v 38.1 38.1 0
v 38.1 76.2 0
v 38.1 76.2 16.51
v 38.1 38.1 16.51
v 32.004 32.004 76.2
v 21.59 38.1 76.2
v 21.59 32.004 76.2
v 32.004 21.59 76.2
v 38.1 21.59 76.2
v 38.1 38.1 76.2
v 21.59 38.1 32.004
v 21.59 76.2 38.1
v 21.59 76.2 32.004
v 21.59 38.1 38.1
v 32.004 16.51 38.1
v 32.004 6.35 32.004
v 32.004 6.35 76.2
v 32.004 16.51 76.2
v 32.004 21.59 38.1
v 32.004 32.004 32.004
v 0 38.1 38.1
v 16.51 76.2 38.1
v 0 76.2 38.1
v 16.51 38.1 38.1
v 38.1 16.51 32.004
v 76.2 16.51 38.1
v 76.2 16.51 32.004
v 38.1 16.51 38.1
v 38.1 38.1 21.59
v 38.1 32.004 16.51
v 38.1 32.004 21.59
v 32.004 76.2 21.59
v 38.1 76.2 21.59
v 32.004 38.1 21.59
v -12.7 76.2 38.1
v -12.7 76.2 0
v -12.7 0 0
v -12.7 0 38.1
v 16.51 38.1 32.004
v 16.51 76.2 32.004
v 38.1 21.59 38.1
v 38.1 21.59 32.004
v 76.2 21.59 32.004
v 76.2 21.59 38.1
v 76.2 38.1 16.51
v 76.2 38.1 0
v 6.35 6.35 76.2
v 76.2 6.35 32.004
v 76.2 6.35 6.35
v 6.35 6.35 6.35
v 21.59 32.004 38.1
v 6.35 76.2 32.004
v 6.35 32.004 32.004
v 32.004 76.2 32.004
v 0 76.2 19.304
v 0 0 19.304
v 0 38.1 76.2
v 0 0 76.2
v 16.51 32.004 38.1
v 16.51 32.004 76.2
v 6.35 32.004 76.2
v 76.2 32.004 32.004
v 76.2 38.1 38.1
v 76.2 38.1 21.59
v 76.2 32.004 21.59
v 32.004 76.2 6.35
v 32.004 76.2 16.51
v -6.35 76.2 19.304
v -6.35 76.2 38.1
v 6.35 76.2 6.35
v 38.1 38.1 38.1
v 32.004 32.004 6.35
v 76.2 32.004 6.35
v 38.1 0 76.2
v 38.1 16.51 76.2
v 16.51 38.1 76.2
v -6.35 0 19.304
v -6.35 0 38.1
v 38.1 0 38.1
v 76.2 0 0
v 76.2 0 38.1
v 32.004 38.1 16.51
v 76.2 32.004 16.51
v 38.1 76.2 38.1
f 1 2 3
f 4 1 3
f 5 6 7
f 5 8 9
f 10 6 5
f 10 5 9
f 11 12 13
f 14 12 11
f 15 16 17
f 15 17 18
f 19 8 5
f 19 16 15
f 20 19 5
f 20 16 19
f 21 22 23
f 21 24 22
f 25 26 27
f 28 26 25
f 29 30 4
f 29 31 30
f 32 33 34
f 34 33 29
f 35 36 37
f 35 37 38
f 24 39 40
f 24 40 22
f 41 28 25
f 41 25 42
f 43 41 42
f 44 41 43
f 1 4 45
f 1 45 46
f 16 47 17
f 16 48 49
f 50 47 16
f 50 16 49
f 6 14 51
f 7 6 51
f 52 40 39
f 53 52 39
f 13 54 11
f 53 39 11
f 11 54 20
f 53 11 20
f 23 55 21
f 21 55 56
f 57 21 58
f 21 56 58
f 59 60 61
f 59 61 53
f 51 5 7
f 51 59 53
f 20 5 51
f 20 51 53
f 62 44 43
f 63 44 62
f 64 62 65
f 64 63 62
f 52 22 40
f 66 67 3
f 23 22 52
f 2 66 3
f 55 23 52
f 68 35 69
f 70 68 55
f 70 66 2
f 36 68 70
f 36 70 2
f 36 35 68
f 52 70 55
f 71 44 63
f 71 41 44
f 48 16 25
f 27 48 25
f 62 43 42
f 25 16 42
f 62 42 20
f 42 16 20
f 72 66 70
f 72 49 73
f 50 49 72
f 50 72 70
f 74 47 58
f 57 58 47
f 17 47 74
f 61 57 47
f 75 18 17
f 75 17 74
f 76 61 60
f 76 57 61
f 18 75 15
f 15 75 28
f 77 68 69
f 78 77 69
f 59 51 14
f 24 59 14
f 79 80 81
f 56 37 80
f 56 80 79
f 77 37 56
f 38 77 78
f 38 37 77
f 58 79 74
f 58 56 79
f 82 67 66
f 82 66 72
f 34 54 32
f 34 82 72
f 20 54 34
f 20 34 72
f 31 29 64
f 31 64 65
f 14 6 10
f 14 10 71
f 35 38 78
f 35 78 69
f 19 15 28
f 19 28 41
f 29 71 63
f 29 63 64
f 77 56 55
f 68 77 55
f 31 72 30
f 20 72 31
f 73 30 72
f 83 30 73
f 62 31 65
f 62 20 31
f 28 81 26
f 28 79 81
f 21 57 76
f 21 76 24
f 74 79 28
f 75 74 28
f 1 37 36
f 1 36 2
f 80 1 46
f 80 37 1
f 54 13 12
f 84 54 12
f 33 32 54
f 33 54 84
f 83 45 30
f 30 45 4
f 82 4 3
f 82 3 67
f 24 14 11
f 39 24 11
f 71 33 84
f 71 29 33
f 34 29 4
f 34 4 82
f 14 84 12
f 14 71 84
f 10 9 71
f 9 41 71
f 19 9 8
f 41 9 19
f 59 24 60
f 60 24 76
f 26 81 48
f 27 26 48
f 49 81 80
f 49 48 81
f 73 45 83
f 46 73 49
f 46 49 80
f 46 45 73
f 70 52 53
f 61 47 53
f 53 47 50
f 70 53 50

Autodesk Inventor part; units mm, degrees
ref_plane "YZ Plane" through (0, 0, 0) normal (1, 0, 0) x (0, 1, 0)
ref_plane "XZ Plane" through (0, 0, 0) normal (0, 1, 0) x (-1, 0, 0)
ref_plane "XY Plane" through (0, 0, 0) normal (0, 0, 1) x (1, 0, 0)
sketch "Sketch1" plane through (0, 0, 0) normal (0, 0, 1) x (1, 0, 0)
  line L0 (0, 0) -> (38.1, 0)
  line L1 (38.1, 0) -> (38.1, 38.1)
  line L2 (38.1, 38.1) -> (0, 38.1)
  line L3 (0, 38.1) -> (0, 0)
  dimension "d0" = 38.1
  dimension "d1" = 38.1
extrude "Extrusion1" add sketch "Sketch1" along normal blind 38.1
sketch "Sketch2" plane through (0, 0, 38.1) normal (0, 0, 1) x (1, 0, 0)
  line L0 (6.35, 6.35) -> (32.004, 6.35)
  line L1 (32.004, 6.35) -> (32.004, 32.004)
  line L2 (32.004, 32.004) -> (6.35, 32.004)
  line L3 (6.35, 32.004) -> (6.35, 6.35)
  line L4 (38.1, 0) -> (38.1, 38.1) projected
  line L5 (0, 0) -> (38.1, 0)
  line L6 (38.1, 0) -> (38.1, 38.1)
  line L7 (38.1, 38.1) -> (0, 38.1)
  line L8 (0, 38.1) -> (0, 0)
  dimension "d4" = 25.654
  dimension "d5" = 25.654
extrude "Extrusion2" cut sketch "Sketch2" against normal blind 31.75 contours L3 L2 L1 L0
sketch "Sketch5" plane through (0, 0, 38.1) normal (0, 0, 1) x (1, 0, 0)
  line L0 (6.35, 6.35) -> (6.35, 32.004) projected
  line L1 (6.35, 6.35) -> (32.004, 6.35)
  line L2 (32.004, 6.35) -> (32.004, 32.004)
  line L3 (32.004, 32.004) -> (6.35, 32.004)
  line L4 (6.35, 32.004) -> (6.35, 6.35)
  line L5 (0, 0) -> (38.1, 0) projected
  line L6 (0, 0) -> (38.1, 0)
  line L7 (38.1, 0) -> (38.1, 38.1)
  line L8 (38.1, 38.1) -> (0, 38.1)
  line L9 (0, 38.1) -> (0, 0)
extrude "Extrusion4" add sketch "Sketch5" along normal blind 38.1
sketch "Sketch7" plane through (38.1, 0, 0) normal (1, 0, 0) x (0, 0, -1)
  line L0 (0, 0) -> (-76.2, 0) projected
  line L1 (0, 0) -> (-38.1, 0)
  line L2 (-38.1, 0) -> (-38.1, 38.1)
  line L3 (-38.1, 38.1) -> (0, 38.1)
  line L4 (0, 38.1) -> (0, 0)
  line L5 (-76.2, 6.35) -> (-6.35, 6.35) projected
  line L6 (-6.35, 6.35) -> (-32.004, 6.35)
  line L7 (-32.004, 6.35) -> (-32.004, 32.004)
  line L8 (-32.004, 32.004) -> (-6.35, 32.004)
  line L9 (-6.35, 32.004) -> (-6.35, 6.35)
  dimension "d16" = 38.1
  dimension "d17" = 38.1
  dimension "d20" = 25.654
  dimension "d21" = 25.654
extrude "Extrusion6" add sketch "Sketch7" along normal blind 38.1
sketch "Sketch9" plane through (38.1, 6.35, 6.35) normal (1, 0, 0) x (0, 0, -1)
  line L0 (-25.654, 0) -> (-25.654, 25.654) projected
  line L1 (0, 0) -> (0, 25.654) projected
  line L2 (-25.654, 0) -> (0, 0)
  line L3 (0, 0) -> (0, 25.654)
  line L4 (0, 25.654) -> (-25.654, 25.654)
  line L5 (-25.654, 25.654) -> (-25.654, 0)
  point P0 (6.35, -6.35)
extrude "Extrusion7" cut sketch "Sketch9" against normal blind 31.75
sketch "Sketch10" plane through (0, 38.1, 76.2) normal (0, 1, 0) x (1, 0, 0)
  line L0 (76.2, 69.85) -> (6.35, 69.85) projected
  line L1 (6.35, 69.85) -> (32.004, 69.85)
  line L2 (32.004, 69.85) -> (32.004, 44.196)
  line L3 (32.004, 44.196) -> (6.35, 44.196)
  line L4 (6.35, 44.196) -> (6.35, 69.85)
  line L5 (38.1, 38.1) -> (38.1, 0) projected
  line L6 (0, 76.2) -> (0, 0) projected
  line L7 (38.1, 38.1) -> (0, 38.1)
  line L8 (0, 38.1) -> (0, 76.2)
  line L9 (0, 76.2) -> (38.1, 76.2)
  line L10 (38.1, 76.2) -> (38.1, 38.1)
  point P0 (0, 38.1)
  dimension "d26" = 25.654
  dimension "d27" = 25.654
extrude "Extrusion8" add sketch "Sketch10" along normal blind 38.1
sketch "Sketch11" plane through (6.35, 38.1, 6.35) normal (0, 1, 0) x (1, 0, 0)
  line L0 (0, -25.654) -> (25.654, -25.654) projected
  line L1 (25.654, -25.654) -> (0, -25.654)
  line L2 (0, -25.654) -> (0, 0)
  line L3 (0, 0) -> (25.654, 0)
  line L4 (25.654, 0) -> (25.654, -25.654)
  point P0 (-6.35, 6.35)
extrude "Extrusion9" cut sketch "Sketch11" against normal blind 6.35
sketch "Sketch12" plane through (0, 76.2, 76.2) normal (0, 1, 0) x (1, 0, 0)
  line L0 (38.1, 55.88) -> (32.004, 55.88)
  line L1 (32.004, 55.88) -> (32.004, 58.42)
  line L2 (32.004, 58.42) -> (38.1, 58.42)
  line L3 (38.1, 58.42) -> (38.1, 55.88)
  point P0 (0, 76.2)
  dimension "d32" = 6.096
  dimension "d33" = 2.54
extrude "Extrusion10" cut sketch "Sketch12" against normal blind 38.1
sketch "Sketch13" plane through (76.2, 38.1, 38.1) normal (0, 1, 0) x (1, 0, 0)
  line L0 (0, 31.75) -> (0, 6.096) projected
  line L1 (-44.196, 17.78) -> (0, 17.78)
  line L2 (0, 17.78) -> (0, 20.32)
  line L3 (0, 20.32) -> (-44.196, 20.32)
  line L4 (-44.196, 20.32) -> (-44.196, 17.78)
  point P0 (-76.2, 38.1)
  dimension "d36" = 2.54
extrude "Extrusion11" cut sketch "Sketch13" against normal blind 6.35
sketch "Sketch15" plane through (0, 76.2, 76.2) normal (0, 1, 0) x (1, 0, 0)
  line L0 (17.78, 38.1) -> (20.32, 38.1)
  line L1 (20.32, 38.1) -> (20.32, 44.196)
  line L2 (20.32, 44.196) -> (17.78, 44.196)
  line L3 (17.78, 44.196) -> (17.78, 38.1)
  point P0 (0, 76.2)
  dimension "d39" = 2.54
  dimension "d40" = 6.096
extrude "Extrusion12" cut sketch "Sketch15" against normal blind 38.1
sketch "Sketch16" plane through (0, 38.1, 76.2) normal (0, 1, 0) x (1, 0, 0)
  line L0 (20.32, 44.196) -> (20.32, 38.1) projected
  line L1 (0, 0) -> (38.1, 0) projected
  line L2 (20.32, 44.196) -> (17.78, 44.196)
  line L3 (17.78, 44.196) -> (17.78, 0)
  line L4 (17.78, 0) -> (20.32, 0)
  line L5 (20.32, 0) -> (20.32, 44.196)
  point P0 (0, 76.2)
  dimension "d43" = 2.54
extrude "Extrusion13" cut sketch "Sketch16" against normal blind 6.35
sketch "Sketch17" plane through (38.1, 0, 76.2) normal (1, 0, 0) x (0, 0, -1)
  line L0 (38.1, 0) -> (38.1, 38.1) projected
  line L1 (0, 17.78) -> (38.1, 17.78)
  line L2 (38.1, 17.78) -> (38.1, 20.32)
  line L3 (38.1, 20.32) -> (0, 20.32)
  line L4 (0, 20.32) -> (0, 17.78)
  point P0 (76.2, 0)
  dimension "d46" = 2.54
extrude "Extrusion14" cut sketch "Sketch17" against normal blind 6.35
sketch "Sketch18" plane through (38.1, 0, 38.1) normal (0, 0, 1) x (1, 0, 0)
  line L0 (0, 17.78) -> (38.1, 17.78)
  line L1 (38.1, 17.78) -> (38.1, 20.32)
  line L2 (38.1, 20.32) -> (0, 20.32)
  line L3 (0, 20.32) -> (0, 17.78)
  point P0 (-38.1, 0)
  dimension "d49" = 38.1
  dimension "d50" = 2.54
extrude "Extrusion15" cut sketch "Sketch18" against normal blind 6.35
sketch "Sketch20" plane through (38.1, 38.1, 38.1) normal (0, 0, 1) x (1, 0, 0)
  line L0 (-17.78, -6.096) -> (-17.78, 38.1) projected
  line L1 (0, 0) -> (-17.78, 0) projected
  line L2 (-17.78, 38.1) -> (-16.51, 38.1)
  line L3 (-16.51, 38.1) -> (-16.51, 0)
  line L4 (-16.51, 0) -> (-17.78, 0)
  line L5 (-17.78, 0) -> (-17.78, 38.1)
  point P0 (-38.1, -38.1)
  dimension "d53" = 1.27
extrude "Extrusion16" cut sketch "Sketch20" against normal blind 6.35
sketch "Sketch21" plane through (38.1, 38.1, 76.2) normal (0, 1, 0) x (1, 0, 0)
  line L0 (-17.78, 0) -> (-17.78, 44.196) projected
  line L1 (0, 0) -> (-17.78, 0) projected
  line L2 (-17.78, 44.196) -> (-16.51, 44.196)
  line L3 (-16.51, 44.196) -> (-16.51, 0)
  line L4 (-16.51, 0) -> (-17.78, 0)
  line L5 (-17.78, 0) -> (-17.78, 44.196)
  point P0 (-38.1, 76.2)
  dimension "d56" = 1.27
extrude "Extrusion17" cut sketch "Sketch21" against normal blind 6.35
sketch "Sketch23" plane through (0, 38.1, 38.1) normal (0, 0, 1) x (1, 0, 0)
  line L0 (17.78, 0) -> (17.78, 38.1) projected
  line L1 (17.78, 0) -> (0, 0) projected
  line L2 (17.78, 38.1) -> (16.51, 38.1)
  line L3 (16.51, 38.1) -> (16.51, 0)
  line L4 (16.51, 0) -> (17.78, 0)
  line L5 (17.78, 0) -> (17.78, 38.1)
  point P0 (0, -38.1)
  dimension "d59" = 1.27
extrude "Extrusion18" cut sketch "Sketch23" against normal blind 6.35
sketch "Sketch24" plane through (0, 38.1, 76.2) normal (0, 1, 0) x (1, 0, 0)
  line L0 (17.78, 44.196) -> (17.78, 0) projected
  line L1 (17.78, 0) -> (0, 0) projected
  line L2 (17.78, 44.196) -> (16.51, 44.196)
  line L3 (16.51, 44.196) -> (16.51, 0)
  line L4 (16.51, 0) -> (17.78, 0)
  line L5 (17.78, 0) -> (17.78, 44.196)
  point P0 (0, 76.2)
  dimension "d62" = 1.27
extrude "Extrusion19" cut sketch "Sketch24" against normal blind 6.35
sketch "Sketch25" plane through (38.1, 0, 76.2) normal (1, 0, 0) x (0, 0, -1)
  line L0 (38.1, 0) -> (38.1, 17.78) projected
  line L1 (38.1, 17.78) -> (0, 17.78)
  line L2 (0, 17.78) -> (0, 16.51)
  line L3 (0, 16.51) -> (38.1, 16.51)
  line L4 (38.1, 16.51) -> (38.1, 17.78)
  point P0 (76.2, 0)
  dimension "d65" = 38.1
  dimension "d66" = 1.27
extrude "Extrusion20" cut sketch "Sketch25" against normal blind 6.35
sketch "Sketch26" plane through (38.1, 38.1, 76.2) normal (1, 0, 0) x (0, 0, -1)
  line L0 (0, -17.78) -> (38.1, -17.78) projected
  line L1 (38.1, -17.78) -> (0, -17.78)
  line L2 (0, -17.78) -> (0, -16.51)
  line L3 (0, -16.51) -> (38.1, -16.51)
  line L4 (38.1, -16.51) -> (38.1, -17.78)
  point P0 (76.2, -38.1)
  dimension "d69" = 38.1
  dimension "d70" = 1.27
extrude "Extrusion21" cut sketch "Sketch26" against normal blind 6.35
sketch "Sketch27" plane through (38.1, 0, 38.1) normal (0, 0, 1) x (1, 0, 0)
  line L0 (0, 21.59) -> (0, 38.1) projected
  line L1 (0, 20.32) -> (38.1, 20.32) projected
  line L2 (0, 21.59) -> (38.1, 21.59)
  line L3 (38.1, 21.59) -> (38.1, 20.32)
  line L4 (38.1, 20.32) -> (0, 20.32)
  line L5 (0, 20.32) -> (0, 21.59)
  line L6 (38.1, 17.78) -> (0, 17.78) projected
  line L7 (0, 17.78) -> (38.1, 17.78)
  line L8 (38.1, 17.78) -> (38.1, 16.51)
  line L9 (38.1, 16.51) -> (0, 16.51)
  line L10 (0, 16.51) -> (0, 17.78)
  point P0 (-38.1, 0)
  dimension "d73" = 38.1
  dimension "d74" = 1.27
extrude "Extrusion22" cut sketch "Sketch27" against normal blind 6.35
sketch "Sketch28" plane through (38.1, 38.1, 38.1) normal (0, 1, 0) x (1, 0, 0)
  line L0 (0, 20.32) -> (38.1, 20.32) projected
  line L1 (0, 20.32) -> (38.1, 20.32)
  line L2 (38.1, 20.32) -> (38.1, 21.59)
  line L3 (38.1, 21.59) -> (0, 21.59)
  line L4 (0, 21.59) -> (0, 20.32)
  line L5 (-6.096, 17.78) -> (38.1, 17.78) projected
  line L6 (38.1, 17.78) -> (0, 17.78)
  line L7 (0, 17.78) -> (0, 16.51)
  line L8 (0, 16.51) -> (38.1, 16.51)
  line L9 (38.1, 16.51) -> (38.1, 17.78)
  point P0 (-38.1, 38.1)
  point P1 (0, 17.78)
  dimension "d77" = 38.1
  dimension "d78" = 1.27
  dimension "d79" = 38.1
  dimension "d80" = 1.27
extrude "Extrusion23" cut sketch "Sketch28" against normal blind 6.35
sketch "Sketch29" plane through (38.1, 38.1, 0) normal (1, 0, 0) x (0, 0, -1)
  line L0 (-17.78, -6.096) -> (-6.35, -6.096) projected
  line L1 (-6.35, 38.1) -> (-17.78, 38.1) projected
  line L2 (-17.78, -6.096) -> (-16.51, -6.096)
  line L3 (-16.51, -6.096) -> (-16.51, 38.1)
  line L4 (-16.51, 38.1) -> (-17.78, 38.1)
  line L5 (-17.78, 38.1) -> (-17.78, -6.096)
  line L6 (-21.59, 0) -> (-21.59, -6.096) projected
  line L7 (-20.32, 38.1) -> (-20.32, -6.096) projected
  line L8 (-21.59, -6.096) -> (-20.32, -6.096)
  line L9 (-20.32, -6.096) -> (-20.32, 38.1)
  line L10 (-20.32, 38.1) -> (-21.59, 38.1)
  line L11 (-21.59, 38.1) -> (-21.59, -6.096)
  point P0 (0, -38.1)
  point P1 (-20.32, -6.096)
  dimension "d83" = 1.27
extrude "Extrusion24" cut sketch "Sketch29" against normal blind 6.35
sketch "Sketch30" plane through (76.2, 38.1, 21.59) normal (0, 0, -1) x (-1, 0, 0)
  line L0 (0, 0) -> (38.1, 0) projected
  line L1 (44.196, 38.1) -> (44.196, -6.096) projected
  line L2 (38.1, 0) -> (44.196, 0)
  line L3 (44.196, 0) -> (44.196, -6.096)
  line L4 (44.196, -6.096) -> (38.1, -6.096)
  line L5 (38.1, -6.096) -> (38.1, 0)
  point P0 (76.2, -38.1)
  point P1 (44.196, 0)
extrude "Extrusion25" add sketch "Sketch30" along normal blind 5.08
sketch "Sketch31" plane through (21.59, 38.1, 38.1) normal (-1, 0, 0) x (0, 0, 1)
  line L0 (38.1, -6.096) -> (-6.096, -6.096) projected
  line L1 (0, 0) -> (-6.096, 0)
  line L2 (-6.096, 0) -> (-6.096, -6.096)
  line L3 (-6.096, -6.096) -> (0, -6.096)
  line L4 (0, -6.096) -> (0, 0)
  point P0 (-38.1, -38.1)
extrude "Extrusion26" add sketch "Sketch31" along normal blind 5.08
sketch "Sketch32" plane through (0, 0, 76.2) normal (-1, 0, 0) x (0, 0, 1)
  line L0 (0, 38.1) -> (0, 0) projected
  line L1 (0, 19.05) -> (-76.2, 19.05)
  line L2 (-76.2, 19.05) -> (-76.2, 0)
  line L3 (-76.2, 0) -> (0, 0)
  line L4 (0, 0) -> (0, 19.05)
  line L5 (-76.2, 0) -> (-56.896, 0)
  line L6 (-56.896, 0) -> (-56.896, 76.2)
  line L7 (-56.896, 76.2) -> (-76.2, 76.2)
  line L8 (-76.2, 76.2) -> (-76.2, 0)
  point P0 (0, 0)
  point P1 (-56.896, 19.05)
  dimension "d90" = 19.304
  dimension "d91" = 76.2
extrude "Extrusion27" add sketch "Sketch32" along normal blind 12.7 contours L6 L3 L2 L1 | L1 L8 L7 L6
sketch "Sketch35" plane through (-12.7, 0, 76.2) normal (-1, 0, 0) x (0, 0, 1)
  line L0 (-38.1, 38.1) -> (-38.1, 76.2) projected
  line L1 (-38.1, 76.2) -> (-56.896, 76.2)
  line L2 (-56.896, 76.2) -> (-56.896, 0)
  line L3 (-56.896, 0) -> (-38.1, 0)
  line L4 (-38.1, 0) -> (-38.1, 76.2)
  point P0 (-76.2, 0)
  dimension "d102" = 18.796
  dimension "d103" = 76.2
extrude "Extrusion30" add sketch "Sketch35" against normal blind 6.35
properties part number "corner connector with rails (front left)"
